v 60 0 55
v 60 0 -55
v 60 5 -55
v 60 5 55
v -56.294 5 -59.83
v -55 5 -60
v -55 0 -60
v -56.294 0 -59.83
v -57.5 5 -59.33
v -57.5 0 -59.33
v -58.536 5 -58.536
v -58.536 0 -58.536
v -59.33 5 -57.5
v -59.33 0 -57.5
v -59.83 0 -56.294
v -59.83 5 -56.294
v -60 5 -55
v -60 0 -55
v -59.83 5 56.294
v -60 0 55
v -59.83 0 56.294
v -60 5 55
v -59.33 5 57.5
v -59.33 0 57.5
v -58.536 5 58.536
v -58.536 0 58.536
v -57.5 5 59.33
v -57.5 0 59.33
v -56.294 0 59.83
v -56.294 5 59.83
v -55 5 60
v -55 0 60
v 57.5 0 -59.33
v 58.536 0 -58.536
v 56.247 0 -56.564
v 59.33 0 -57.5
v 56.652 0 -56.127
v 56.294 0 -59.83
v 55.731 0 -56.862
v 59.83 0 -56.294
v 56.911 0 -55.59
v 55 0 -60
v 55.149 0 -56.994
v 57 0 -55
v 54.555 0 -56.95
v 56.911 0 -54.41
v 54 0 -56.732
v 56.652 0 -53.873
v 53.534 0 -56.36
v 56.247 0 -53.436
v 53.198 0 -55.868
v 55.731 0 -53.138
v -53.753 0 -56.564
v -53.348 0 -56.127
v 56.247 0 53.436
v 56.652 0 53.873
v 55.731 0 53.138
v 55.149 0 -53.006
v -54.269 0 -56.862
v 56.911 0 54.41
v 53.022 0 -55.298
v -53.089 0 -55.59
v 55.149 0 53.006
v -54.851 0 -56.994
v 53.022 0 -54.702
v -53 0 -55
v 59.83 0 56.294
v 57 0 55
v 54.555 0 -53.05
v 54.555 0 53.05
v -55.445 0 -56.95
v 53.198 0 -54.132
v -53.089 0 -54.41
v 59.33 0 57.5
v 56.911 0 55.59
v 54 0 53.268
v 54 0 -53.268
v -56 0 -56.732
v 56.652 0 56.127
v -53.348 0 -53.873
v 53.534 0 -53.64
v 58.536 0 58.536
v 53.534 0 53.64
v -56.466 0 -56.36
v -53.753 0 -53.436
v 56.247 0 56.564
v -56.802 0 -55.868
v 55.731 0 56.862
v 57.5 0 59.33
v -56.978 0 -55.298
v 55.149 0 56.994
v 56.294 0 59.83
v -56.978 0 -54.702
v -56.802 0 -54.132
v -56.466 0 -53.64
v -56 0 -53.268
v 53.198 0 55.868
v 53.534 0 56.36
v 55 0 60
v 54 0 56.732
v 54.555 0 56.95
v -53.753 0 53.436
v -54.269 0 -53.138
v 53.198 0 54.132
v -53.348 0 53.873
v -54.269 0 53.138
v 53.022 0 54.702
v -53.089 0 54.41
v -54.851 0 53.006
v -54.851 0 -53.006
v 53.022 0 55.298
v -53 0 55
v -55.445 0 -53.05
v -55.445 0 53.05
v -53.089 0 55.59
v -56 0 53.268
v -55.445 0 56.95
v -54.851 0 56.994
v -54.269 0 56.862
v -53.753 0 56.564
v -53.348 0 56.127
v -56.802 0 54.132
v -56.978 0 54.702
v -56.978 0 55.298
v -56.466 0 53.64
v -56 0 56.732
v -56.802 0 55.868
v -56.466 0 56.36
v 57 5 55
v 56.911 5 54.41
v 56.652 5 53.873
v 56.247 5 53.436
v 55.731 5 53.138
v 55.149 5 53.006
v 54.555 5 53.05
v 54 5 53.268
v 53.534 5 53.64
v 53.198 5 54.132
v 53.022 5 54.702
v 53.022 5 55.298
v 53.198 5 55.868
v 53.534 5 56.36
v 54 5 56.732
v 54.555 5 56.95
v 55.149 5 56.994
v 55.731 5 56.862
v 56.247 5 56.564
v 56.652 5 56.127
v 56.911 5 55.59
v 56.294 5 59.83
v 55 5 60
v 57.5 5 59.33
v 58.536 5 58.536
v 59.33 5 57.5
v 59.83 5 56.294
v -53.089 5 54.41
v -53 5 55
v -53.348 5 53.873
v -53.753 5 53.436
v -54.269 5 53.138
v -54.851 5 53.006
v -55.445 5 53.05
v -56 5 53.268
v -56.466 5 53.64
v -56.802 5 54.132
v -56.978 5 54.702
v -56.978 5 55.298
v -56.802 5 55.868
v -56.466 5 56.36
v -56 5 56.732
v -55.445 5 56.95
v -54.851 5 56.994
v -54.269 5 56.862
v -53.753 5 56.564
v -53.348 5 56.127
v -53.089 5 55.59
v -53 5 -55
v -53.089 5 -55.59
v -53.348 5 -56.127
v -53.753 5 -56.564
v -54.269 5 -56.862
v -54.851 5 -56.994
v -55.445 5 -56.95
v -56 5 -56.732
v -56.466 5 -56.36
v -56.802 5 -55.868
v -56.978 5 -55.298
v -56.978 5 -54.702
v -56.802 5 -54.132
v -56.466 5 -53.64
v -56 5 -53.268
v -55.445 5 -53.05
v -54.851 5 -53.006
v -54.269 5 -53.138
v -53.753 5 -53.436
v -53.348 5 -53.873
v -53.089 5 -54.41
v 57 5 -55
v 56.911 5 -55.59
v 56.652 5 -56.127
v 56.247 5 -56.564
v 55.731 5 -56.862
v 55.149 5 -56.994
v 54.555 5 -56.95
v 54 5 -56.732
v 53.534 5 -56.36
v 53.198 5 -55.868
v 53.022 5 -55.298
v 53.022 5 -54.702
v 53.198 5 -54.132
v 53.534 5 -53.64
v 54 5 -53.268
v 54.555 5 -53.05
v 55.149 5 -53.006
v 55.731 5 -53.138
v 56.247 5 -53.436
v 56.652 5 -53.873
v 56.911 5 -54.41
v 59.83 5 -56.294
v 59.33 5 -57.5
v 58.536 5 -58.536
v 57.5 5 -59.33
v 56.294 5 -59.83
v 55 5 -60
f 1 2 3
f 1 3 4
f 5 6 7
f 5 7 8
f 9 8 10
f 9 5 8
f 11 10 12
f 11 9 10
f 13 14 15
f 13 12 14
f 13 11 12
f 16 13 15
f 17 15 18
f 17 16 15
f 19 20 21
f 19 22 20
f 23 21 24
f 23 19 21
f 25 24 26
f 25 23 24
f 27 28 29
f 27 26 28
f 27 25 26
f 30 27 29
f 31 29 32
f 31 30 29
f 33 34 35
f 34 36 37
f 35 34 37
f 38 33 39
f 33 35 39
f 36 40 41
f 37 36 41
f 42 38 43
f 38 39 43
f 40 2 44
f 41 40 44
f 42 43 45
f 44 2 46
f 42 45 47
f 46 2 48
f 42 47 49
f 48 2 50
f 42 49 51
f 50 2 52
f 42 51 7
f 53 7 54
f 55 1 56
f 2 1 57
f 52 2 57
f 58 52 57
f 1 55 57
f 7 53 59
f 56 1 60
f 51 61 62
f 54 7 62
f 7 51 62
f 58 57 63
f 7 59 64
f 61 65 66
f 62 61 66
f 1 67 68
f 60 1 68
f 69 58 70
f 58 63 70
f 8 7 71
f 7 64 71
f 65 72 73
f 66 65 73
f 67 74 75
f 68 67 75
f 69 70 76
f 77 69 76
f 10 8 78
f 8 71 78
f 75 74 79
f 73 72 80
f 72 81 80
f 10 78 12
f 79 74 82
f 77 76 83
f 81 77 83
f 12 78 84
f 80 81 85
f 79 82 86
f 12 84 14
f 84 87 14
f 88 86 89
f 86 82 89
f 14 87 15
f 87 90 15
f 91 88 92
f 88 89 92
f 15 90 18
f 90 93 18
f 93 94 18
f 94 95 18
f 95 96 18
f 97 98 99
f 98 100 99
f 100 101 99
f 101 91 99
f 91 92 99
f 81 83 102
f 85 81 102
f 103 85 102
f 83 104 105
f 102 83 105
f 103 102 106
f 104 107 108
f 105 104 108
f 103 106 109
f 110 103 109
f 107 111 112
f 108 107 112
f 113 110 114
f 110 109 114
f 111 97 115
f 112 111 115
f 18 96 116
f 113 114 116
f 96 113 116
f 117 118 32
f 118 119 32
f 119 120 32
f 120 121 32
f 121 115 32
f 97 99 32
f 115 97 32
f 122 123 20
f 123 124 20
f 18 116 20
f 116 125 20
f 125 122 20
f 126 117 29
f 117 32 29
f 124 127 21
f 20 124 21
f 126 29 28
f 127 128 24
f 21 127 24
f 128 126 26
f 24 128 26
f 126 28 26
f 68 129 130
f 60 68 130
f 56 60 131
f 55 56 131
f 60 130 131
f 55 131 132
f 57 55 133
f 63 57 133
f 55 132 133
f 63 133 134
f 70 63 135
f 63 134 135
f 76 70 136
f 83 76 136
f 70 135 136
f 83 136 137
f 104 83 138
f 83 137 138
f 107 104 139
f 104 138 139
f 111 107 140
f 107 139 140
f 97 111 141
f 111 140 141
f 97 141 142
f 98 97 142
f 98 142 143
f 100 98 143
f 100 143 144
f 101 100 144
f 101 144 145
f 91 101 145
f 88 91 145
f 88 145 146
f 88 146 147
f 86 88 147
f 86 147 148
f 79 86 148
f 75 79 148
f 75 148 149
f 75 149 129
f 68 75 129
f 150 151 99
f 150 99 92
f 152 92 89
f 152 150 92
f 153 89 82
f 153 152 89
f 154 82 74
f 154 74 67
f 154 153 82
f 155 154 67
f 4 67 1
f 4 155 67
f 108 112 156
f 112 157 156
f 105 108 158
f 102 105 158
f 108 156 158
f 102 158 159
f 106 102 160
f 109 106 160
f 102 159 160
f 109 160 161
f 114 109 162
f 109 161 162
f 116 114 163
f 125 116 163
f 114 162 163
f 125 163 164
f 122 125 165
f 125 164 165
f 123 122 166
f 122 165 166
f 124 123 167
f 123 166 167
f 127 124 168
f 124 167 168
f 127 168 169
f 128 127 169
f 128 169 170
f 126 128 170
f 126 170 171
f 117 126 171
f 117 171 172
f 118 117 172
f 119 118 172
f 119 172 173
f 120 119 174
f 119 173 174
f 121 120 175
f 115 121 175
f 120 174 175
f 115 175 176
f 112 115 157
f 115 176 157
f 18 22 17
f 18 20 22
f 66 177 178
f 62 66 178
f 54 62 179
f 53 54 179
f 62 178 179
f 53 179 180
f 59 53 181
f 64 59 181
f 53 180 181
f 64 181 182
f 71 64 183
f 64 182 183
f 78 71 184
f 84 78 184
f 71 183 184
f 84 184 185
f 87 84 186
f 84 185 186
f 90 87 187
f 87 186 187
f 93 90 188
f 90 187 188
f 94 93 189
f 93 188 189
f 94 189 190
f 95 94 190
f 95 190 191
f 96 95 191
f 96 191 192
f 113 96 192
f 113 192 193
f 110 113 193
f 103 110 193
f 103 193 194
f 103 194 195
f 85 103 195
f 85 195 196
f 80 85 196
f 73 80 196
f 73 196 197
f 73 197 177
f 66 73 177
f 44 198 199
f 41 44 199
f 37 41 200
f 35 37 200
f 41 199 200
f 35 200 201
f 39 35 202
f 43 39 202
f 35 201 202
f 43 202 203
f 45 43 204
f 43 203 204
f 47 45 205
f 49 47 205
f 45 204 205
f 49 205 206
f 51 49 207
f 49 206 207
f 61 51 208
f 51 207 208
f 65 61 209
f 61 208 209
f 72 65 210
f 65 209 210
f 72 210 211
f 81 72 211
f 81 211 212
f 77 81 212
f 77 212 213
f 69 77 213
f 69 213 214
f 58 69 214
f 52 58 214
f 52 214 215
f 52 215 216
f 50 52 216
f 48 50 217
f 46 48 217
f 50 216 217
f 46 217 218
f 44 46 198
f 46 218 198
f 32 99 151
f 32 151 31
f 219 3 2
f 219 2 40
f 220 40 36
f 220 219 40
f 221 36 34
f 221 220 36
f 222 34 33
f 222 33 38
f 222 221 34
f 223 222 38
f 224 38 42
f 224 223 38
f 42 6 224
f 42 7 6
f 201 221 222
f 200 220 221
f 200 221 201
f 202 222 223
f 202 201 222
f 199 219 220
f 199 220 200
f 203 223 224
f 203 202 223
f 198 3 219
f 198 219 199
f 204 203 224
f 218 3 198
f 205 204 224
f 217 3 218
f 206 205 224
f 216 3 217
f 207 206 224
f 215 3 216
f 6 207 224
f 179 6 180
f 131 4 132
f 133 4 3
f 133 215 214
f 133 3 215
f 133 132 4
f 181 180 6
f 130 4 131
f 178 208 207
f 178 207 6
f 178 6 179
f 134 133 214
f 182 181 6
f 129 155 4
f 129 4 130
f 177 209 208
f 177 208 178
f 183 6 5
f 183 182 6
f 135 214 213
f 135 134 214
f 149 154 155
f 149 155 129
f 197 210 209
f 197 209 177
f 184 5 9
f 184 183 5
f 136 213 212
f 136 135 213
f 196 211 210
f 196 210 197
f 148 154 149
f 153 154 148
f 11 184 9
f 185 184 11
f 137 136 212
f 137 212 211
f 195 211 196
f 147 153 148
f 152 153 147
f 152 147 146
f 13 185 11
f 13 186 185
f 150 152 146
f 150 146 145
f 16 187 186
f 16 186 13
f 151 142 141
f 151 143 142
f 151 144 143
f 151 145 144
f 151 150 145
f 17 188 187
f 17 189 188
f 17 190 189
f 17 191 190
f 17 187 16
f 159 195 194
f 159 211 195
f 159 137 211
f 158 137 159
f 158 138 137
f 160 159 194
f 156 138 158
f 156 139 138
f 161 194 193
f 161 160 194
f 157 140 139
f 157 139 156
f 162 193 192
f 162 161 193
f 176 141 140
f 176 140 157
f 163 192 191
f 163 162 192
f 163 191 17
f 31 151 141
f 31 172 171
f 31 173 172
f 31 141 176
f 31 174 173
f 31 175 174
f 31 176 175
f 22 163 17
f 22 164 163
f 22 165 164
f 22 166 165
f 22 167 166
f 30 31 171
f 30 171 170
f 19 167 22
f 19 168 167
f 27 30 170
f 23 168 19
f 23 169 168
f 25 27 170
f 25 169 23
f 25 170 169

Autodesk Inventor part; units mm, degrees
ref_plane "YZ Plane" through (0, 0, 0) normal (1, 0, 0) x (0, 1, 0)
ref_plane "XZ Plane" through (0, 0, 0) normal (0, 1, 0) x (-1, 0, 0)
ref_plane "XY Plane" through (0, 0, 0) normal (0, 0, 1) x (1, 0, 0)
sketch "Sketch1" plane through (0, 0, 0) normal (0, 1, 0) x (-1, 0, 0)
  line L0 (-60, 60) -> (60, 60)
  line L1 (60, 60) -> (60, -60)
  line L2 (60, -60) -> (-60, -60)
  line L3 (-60, -60) -> (-60, 60)
  line L4 (-60, 60) -> (60, -60) construction
  line L5 (60, 60) -> (-60, -60) construction
  point P0 (0, 0)
  dimension "d0" = 120
  dimension "d1" = 120
extrude "Extrusion1" add sketch "Sketch1" along normal blind 5
sketch "Sketch2" plane through (0, 5, 0) normal (0, 1, 0) x (1, 0, 0)
  line L0 (55, -55) -> (-55, -55) construction
  line L1 (-55, -55) -> (-55, 55) construction
  line L2 (-55, 55) -> (55, 55) construction
  line L3 (55, 55) -> (55, -55) construction
  line L4 (55, -55) -> (-55, 55) construction
  line L5 (-55, -55) -> (55, 55) construction
  circle A0 centre (-55, 55) radius 2
  circle A1 centre (-55, -55) radius 2
  circle A2 centre (55, 55) radius 2
  circle A3 centre (55, -55) radius 2
  point P0 (0, 0)
  dimension "d4" = 110
  dimension "d5" = 110
  dimension "d6" = 4
  dimension "d7" = 4
  dimension "d8" = 4
  dimension "d9" = 4
extrude "Extrusion2" cut sketch "Sketch2" against normal blind 5
fillet "Fillet1" radius 5 4 edges at (60, 2.5, -60) (60, 2.5, 60) (-60, 2.5, -60) (-60, 2.5, 60)
sketch "Sketch3" plane through (0, 5, 0) normal (0, 1, 0) x (1, 0, 0)
  circle A0 centre (0, 0) radius 7.5
  dimension "d13" = 15
properties part number "Arena"
